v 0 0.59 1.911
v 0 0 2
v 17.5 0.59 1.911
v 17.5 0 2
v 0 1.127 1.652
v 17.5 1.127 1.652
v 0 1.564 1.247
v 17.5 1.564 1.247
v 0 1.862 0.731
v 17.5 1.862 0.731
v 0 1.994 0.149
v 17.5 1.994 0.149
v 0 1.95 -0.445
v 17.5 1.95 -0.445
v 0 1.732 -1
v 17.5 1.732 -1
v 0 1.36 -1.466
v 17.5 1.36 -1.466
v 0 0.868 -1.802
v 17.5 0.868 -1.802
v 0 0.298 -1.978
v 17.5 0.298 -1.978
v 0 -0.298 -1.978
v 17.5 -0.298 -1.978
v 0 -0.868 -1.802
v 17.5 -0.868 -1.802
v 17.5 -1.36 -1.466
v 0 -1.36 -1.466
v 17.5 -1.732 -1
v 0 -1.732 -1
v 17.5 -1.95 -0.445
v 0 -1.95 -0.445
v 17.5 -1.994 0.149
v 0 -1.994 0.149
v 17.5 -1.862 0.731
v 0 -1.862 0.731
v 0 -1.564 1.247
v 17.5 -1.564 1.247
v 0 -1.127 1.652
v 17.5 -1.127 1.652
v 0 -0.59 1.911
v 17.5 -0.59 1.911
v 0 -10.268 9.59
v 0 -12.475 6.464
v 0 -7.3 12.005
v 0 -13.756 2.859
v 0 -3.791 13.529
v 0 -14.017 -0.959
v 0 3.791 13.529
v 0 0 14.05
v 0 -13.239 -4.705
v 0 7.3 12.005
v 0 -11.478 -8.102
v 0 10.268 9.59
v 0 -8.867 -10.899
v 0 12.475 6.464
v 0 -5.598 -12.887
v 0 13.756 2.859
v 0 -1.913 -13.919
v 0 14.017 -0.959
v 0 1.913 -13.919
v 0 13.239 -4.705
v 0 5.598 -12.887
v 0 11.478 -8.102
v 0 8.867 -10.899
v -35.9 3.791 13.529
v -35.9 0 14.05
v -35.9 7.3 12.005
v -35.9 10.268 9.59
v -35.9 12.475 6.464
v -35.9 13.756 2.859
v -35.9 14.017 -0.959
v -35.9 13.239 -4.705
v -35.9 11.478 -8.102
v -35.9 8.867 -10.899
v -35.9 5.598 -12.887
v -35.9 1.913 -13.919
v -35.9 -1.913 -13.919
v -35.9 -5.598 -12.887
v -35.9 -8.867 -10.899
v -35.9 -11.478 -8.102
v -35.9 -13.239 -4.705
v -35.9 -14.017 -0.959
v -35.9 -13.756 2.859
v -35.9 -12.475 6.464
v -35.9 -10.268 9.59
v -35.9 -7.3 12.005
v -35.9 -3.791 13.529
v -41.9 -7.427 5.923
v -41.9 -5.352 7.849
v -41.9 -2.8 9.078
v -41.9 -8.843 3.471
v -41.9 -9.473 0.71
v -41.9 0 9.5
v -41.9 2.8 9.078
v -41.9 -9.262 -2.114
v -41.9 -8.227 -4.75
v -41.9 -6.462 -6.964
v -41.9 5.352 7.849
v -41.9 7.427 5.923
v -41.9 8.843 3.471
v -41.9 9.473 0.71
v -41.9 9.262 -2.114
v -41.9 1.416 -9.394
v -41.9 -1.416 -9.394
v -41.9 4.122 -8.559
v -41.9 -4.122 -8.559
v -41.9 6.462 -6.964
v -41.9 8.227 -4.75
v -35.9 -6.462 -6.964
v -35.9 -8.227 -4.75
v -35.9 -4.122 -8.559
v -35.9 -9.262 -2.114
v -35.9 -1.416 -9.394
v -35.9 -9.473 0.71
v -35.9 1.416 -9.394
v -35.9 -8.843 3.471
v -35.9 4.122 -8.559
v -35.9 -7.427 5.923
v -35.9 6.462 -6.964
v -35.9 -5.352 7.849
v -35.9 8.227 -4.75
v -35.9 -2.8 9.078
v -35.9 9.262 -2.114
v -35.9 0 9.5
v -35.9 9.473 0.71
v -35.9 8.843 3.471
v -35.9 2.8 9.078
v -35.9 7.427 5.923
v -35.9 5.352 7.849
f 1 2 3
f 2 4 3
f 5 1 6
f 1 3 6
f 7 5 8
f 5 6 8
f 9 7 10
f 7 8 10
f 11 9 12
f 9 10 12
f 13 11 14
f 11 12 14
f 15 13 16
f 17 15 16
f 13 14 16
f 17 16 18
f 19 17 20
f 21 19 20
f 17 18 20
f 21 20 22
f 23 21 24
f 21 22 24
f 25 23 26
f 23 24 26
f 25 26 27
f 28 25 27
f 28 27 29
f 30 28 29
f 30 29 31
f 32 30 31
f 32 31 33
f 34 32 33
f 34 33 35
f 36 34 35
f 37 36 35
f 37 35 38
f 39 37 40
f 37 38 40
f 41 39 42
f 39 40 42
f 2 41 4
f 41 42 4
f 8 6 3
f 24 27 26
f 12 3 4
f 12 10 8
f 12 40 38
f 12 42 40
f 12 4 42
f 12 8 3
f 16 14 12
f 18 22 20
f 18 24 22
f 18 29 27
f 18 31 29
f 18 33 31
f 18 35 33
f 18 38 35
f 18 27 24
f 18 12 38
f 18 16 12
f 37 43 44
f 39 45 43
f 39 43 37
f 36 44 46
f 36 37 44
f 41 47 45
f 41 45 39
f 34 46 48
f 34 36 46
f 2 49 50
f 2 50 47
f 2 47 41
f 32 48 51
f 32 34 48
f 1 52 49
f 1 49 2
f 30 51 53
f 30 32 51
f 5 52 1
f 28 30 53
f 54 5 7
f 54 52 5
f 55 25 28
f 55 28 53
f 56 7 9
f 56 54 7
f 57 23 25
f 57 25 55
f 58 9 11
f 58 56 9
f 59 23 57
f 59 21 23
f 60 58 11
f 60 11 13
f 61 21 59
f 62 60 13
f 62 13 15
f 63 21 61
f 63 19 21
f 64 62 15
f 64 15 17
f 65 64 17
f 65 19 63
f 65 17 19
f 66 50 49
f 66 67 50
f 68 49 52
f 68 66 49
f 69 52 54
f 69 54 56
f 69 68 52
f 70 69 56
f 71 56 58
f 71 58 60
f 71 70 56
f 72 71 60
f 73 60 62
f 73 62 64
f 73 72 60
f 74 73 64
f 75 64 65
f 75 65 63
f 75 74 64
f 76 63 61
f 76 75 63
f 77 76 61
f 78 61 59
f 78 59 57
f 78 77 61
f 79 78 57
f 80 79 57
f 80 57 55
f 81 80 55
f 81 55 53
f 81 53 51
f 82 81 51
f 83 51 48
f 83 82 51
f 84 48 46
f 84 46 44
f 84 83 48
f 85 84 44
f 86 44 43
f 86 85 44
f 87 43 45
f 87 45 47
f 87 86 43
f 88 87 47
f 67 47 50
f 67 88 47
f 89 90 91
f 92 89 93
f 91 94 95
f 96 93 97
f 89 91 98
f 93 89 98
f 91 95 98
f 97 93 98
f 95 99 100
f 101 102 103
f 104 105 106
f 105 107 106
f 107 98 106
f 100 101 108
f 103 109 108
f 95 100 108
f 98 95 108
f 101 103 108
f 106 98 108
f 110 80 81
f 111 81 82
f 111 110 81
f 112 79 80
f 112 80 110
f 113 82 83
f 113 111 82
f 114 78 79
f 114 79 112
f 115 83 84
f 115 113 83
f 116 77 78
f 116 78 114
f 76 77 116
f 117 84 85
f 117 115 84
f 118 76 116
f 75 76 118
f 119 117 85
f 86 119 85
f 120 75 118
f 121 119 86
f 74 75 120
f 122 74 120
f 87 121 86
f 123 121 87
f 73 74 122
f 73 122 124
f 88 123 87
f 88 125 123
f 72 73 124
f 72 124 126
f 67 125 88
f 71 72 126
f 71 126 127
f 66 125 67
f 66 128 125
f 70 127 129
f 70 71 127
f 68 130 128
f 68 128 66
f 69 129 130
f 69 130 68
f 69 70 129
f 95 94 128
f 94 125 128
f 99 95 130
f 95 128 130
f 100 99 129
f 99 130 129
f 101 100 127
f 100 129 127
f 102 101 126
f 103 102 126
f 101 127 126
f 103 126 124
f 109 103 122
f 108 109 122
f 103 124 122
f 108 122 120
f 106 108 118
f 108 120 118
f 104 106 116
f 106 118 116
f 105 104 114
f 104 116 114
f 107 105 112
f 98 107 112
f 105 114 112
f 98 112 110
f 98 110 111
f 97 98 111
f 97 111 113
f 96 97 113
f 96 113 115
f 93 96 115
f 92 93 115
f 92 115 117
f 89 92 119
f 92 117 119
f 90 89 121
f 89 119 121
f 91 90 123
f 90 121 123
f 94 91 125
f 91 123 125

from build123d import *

# Parameters (mm, degrees)
F0_W   = 6
F0_H   = 9.5
F0_W_2 = 17.5
F0_H_2 = 2


with BuildPart() as f1:
    # F0 (on Front) → F1 (revolve)
    with BuildSketch(Plane.XZ):
        Polygon((0, 14.05), (-35.9, 14.05), (-35.9, 9.5), (-35.9, 0), (0, 0), (0, 2), align=None)
        with Locations((-38.9, 4.75)):
            Rectangle(F0_W, F0_H)
        with Locations((8.75, 1)):
            Rectangle(F0_W_2, F0_H_2)
    revolve(axis=Axis((-20.95, 0, 0), (-1, 0, 0)))


solid = f1.part
